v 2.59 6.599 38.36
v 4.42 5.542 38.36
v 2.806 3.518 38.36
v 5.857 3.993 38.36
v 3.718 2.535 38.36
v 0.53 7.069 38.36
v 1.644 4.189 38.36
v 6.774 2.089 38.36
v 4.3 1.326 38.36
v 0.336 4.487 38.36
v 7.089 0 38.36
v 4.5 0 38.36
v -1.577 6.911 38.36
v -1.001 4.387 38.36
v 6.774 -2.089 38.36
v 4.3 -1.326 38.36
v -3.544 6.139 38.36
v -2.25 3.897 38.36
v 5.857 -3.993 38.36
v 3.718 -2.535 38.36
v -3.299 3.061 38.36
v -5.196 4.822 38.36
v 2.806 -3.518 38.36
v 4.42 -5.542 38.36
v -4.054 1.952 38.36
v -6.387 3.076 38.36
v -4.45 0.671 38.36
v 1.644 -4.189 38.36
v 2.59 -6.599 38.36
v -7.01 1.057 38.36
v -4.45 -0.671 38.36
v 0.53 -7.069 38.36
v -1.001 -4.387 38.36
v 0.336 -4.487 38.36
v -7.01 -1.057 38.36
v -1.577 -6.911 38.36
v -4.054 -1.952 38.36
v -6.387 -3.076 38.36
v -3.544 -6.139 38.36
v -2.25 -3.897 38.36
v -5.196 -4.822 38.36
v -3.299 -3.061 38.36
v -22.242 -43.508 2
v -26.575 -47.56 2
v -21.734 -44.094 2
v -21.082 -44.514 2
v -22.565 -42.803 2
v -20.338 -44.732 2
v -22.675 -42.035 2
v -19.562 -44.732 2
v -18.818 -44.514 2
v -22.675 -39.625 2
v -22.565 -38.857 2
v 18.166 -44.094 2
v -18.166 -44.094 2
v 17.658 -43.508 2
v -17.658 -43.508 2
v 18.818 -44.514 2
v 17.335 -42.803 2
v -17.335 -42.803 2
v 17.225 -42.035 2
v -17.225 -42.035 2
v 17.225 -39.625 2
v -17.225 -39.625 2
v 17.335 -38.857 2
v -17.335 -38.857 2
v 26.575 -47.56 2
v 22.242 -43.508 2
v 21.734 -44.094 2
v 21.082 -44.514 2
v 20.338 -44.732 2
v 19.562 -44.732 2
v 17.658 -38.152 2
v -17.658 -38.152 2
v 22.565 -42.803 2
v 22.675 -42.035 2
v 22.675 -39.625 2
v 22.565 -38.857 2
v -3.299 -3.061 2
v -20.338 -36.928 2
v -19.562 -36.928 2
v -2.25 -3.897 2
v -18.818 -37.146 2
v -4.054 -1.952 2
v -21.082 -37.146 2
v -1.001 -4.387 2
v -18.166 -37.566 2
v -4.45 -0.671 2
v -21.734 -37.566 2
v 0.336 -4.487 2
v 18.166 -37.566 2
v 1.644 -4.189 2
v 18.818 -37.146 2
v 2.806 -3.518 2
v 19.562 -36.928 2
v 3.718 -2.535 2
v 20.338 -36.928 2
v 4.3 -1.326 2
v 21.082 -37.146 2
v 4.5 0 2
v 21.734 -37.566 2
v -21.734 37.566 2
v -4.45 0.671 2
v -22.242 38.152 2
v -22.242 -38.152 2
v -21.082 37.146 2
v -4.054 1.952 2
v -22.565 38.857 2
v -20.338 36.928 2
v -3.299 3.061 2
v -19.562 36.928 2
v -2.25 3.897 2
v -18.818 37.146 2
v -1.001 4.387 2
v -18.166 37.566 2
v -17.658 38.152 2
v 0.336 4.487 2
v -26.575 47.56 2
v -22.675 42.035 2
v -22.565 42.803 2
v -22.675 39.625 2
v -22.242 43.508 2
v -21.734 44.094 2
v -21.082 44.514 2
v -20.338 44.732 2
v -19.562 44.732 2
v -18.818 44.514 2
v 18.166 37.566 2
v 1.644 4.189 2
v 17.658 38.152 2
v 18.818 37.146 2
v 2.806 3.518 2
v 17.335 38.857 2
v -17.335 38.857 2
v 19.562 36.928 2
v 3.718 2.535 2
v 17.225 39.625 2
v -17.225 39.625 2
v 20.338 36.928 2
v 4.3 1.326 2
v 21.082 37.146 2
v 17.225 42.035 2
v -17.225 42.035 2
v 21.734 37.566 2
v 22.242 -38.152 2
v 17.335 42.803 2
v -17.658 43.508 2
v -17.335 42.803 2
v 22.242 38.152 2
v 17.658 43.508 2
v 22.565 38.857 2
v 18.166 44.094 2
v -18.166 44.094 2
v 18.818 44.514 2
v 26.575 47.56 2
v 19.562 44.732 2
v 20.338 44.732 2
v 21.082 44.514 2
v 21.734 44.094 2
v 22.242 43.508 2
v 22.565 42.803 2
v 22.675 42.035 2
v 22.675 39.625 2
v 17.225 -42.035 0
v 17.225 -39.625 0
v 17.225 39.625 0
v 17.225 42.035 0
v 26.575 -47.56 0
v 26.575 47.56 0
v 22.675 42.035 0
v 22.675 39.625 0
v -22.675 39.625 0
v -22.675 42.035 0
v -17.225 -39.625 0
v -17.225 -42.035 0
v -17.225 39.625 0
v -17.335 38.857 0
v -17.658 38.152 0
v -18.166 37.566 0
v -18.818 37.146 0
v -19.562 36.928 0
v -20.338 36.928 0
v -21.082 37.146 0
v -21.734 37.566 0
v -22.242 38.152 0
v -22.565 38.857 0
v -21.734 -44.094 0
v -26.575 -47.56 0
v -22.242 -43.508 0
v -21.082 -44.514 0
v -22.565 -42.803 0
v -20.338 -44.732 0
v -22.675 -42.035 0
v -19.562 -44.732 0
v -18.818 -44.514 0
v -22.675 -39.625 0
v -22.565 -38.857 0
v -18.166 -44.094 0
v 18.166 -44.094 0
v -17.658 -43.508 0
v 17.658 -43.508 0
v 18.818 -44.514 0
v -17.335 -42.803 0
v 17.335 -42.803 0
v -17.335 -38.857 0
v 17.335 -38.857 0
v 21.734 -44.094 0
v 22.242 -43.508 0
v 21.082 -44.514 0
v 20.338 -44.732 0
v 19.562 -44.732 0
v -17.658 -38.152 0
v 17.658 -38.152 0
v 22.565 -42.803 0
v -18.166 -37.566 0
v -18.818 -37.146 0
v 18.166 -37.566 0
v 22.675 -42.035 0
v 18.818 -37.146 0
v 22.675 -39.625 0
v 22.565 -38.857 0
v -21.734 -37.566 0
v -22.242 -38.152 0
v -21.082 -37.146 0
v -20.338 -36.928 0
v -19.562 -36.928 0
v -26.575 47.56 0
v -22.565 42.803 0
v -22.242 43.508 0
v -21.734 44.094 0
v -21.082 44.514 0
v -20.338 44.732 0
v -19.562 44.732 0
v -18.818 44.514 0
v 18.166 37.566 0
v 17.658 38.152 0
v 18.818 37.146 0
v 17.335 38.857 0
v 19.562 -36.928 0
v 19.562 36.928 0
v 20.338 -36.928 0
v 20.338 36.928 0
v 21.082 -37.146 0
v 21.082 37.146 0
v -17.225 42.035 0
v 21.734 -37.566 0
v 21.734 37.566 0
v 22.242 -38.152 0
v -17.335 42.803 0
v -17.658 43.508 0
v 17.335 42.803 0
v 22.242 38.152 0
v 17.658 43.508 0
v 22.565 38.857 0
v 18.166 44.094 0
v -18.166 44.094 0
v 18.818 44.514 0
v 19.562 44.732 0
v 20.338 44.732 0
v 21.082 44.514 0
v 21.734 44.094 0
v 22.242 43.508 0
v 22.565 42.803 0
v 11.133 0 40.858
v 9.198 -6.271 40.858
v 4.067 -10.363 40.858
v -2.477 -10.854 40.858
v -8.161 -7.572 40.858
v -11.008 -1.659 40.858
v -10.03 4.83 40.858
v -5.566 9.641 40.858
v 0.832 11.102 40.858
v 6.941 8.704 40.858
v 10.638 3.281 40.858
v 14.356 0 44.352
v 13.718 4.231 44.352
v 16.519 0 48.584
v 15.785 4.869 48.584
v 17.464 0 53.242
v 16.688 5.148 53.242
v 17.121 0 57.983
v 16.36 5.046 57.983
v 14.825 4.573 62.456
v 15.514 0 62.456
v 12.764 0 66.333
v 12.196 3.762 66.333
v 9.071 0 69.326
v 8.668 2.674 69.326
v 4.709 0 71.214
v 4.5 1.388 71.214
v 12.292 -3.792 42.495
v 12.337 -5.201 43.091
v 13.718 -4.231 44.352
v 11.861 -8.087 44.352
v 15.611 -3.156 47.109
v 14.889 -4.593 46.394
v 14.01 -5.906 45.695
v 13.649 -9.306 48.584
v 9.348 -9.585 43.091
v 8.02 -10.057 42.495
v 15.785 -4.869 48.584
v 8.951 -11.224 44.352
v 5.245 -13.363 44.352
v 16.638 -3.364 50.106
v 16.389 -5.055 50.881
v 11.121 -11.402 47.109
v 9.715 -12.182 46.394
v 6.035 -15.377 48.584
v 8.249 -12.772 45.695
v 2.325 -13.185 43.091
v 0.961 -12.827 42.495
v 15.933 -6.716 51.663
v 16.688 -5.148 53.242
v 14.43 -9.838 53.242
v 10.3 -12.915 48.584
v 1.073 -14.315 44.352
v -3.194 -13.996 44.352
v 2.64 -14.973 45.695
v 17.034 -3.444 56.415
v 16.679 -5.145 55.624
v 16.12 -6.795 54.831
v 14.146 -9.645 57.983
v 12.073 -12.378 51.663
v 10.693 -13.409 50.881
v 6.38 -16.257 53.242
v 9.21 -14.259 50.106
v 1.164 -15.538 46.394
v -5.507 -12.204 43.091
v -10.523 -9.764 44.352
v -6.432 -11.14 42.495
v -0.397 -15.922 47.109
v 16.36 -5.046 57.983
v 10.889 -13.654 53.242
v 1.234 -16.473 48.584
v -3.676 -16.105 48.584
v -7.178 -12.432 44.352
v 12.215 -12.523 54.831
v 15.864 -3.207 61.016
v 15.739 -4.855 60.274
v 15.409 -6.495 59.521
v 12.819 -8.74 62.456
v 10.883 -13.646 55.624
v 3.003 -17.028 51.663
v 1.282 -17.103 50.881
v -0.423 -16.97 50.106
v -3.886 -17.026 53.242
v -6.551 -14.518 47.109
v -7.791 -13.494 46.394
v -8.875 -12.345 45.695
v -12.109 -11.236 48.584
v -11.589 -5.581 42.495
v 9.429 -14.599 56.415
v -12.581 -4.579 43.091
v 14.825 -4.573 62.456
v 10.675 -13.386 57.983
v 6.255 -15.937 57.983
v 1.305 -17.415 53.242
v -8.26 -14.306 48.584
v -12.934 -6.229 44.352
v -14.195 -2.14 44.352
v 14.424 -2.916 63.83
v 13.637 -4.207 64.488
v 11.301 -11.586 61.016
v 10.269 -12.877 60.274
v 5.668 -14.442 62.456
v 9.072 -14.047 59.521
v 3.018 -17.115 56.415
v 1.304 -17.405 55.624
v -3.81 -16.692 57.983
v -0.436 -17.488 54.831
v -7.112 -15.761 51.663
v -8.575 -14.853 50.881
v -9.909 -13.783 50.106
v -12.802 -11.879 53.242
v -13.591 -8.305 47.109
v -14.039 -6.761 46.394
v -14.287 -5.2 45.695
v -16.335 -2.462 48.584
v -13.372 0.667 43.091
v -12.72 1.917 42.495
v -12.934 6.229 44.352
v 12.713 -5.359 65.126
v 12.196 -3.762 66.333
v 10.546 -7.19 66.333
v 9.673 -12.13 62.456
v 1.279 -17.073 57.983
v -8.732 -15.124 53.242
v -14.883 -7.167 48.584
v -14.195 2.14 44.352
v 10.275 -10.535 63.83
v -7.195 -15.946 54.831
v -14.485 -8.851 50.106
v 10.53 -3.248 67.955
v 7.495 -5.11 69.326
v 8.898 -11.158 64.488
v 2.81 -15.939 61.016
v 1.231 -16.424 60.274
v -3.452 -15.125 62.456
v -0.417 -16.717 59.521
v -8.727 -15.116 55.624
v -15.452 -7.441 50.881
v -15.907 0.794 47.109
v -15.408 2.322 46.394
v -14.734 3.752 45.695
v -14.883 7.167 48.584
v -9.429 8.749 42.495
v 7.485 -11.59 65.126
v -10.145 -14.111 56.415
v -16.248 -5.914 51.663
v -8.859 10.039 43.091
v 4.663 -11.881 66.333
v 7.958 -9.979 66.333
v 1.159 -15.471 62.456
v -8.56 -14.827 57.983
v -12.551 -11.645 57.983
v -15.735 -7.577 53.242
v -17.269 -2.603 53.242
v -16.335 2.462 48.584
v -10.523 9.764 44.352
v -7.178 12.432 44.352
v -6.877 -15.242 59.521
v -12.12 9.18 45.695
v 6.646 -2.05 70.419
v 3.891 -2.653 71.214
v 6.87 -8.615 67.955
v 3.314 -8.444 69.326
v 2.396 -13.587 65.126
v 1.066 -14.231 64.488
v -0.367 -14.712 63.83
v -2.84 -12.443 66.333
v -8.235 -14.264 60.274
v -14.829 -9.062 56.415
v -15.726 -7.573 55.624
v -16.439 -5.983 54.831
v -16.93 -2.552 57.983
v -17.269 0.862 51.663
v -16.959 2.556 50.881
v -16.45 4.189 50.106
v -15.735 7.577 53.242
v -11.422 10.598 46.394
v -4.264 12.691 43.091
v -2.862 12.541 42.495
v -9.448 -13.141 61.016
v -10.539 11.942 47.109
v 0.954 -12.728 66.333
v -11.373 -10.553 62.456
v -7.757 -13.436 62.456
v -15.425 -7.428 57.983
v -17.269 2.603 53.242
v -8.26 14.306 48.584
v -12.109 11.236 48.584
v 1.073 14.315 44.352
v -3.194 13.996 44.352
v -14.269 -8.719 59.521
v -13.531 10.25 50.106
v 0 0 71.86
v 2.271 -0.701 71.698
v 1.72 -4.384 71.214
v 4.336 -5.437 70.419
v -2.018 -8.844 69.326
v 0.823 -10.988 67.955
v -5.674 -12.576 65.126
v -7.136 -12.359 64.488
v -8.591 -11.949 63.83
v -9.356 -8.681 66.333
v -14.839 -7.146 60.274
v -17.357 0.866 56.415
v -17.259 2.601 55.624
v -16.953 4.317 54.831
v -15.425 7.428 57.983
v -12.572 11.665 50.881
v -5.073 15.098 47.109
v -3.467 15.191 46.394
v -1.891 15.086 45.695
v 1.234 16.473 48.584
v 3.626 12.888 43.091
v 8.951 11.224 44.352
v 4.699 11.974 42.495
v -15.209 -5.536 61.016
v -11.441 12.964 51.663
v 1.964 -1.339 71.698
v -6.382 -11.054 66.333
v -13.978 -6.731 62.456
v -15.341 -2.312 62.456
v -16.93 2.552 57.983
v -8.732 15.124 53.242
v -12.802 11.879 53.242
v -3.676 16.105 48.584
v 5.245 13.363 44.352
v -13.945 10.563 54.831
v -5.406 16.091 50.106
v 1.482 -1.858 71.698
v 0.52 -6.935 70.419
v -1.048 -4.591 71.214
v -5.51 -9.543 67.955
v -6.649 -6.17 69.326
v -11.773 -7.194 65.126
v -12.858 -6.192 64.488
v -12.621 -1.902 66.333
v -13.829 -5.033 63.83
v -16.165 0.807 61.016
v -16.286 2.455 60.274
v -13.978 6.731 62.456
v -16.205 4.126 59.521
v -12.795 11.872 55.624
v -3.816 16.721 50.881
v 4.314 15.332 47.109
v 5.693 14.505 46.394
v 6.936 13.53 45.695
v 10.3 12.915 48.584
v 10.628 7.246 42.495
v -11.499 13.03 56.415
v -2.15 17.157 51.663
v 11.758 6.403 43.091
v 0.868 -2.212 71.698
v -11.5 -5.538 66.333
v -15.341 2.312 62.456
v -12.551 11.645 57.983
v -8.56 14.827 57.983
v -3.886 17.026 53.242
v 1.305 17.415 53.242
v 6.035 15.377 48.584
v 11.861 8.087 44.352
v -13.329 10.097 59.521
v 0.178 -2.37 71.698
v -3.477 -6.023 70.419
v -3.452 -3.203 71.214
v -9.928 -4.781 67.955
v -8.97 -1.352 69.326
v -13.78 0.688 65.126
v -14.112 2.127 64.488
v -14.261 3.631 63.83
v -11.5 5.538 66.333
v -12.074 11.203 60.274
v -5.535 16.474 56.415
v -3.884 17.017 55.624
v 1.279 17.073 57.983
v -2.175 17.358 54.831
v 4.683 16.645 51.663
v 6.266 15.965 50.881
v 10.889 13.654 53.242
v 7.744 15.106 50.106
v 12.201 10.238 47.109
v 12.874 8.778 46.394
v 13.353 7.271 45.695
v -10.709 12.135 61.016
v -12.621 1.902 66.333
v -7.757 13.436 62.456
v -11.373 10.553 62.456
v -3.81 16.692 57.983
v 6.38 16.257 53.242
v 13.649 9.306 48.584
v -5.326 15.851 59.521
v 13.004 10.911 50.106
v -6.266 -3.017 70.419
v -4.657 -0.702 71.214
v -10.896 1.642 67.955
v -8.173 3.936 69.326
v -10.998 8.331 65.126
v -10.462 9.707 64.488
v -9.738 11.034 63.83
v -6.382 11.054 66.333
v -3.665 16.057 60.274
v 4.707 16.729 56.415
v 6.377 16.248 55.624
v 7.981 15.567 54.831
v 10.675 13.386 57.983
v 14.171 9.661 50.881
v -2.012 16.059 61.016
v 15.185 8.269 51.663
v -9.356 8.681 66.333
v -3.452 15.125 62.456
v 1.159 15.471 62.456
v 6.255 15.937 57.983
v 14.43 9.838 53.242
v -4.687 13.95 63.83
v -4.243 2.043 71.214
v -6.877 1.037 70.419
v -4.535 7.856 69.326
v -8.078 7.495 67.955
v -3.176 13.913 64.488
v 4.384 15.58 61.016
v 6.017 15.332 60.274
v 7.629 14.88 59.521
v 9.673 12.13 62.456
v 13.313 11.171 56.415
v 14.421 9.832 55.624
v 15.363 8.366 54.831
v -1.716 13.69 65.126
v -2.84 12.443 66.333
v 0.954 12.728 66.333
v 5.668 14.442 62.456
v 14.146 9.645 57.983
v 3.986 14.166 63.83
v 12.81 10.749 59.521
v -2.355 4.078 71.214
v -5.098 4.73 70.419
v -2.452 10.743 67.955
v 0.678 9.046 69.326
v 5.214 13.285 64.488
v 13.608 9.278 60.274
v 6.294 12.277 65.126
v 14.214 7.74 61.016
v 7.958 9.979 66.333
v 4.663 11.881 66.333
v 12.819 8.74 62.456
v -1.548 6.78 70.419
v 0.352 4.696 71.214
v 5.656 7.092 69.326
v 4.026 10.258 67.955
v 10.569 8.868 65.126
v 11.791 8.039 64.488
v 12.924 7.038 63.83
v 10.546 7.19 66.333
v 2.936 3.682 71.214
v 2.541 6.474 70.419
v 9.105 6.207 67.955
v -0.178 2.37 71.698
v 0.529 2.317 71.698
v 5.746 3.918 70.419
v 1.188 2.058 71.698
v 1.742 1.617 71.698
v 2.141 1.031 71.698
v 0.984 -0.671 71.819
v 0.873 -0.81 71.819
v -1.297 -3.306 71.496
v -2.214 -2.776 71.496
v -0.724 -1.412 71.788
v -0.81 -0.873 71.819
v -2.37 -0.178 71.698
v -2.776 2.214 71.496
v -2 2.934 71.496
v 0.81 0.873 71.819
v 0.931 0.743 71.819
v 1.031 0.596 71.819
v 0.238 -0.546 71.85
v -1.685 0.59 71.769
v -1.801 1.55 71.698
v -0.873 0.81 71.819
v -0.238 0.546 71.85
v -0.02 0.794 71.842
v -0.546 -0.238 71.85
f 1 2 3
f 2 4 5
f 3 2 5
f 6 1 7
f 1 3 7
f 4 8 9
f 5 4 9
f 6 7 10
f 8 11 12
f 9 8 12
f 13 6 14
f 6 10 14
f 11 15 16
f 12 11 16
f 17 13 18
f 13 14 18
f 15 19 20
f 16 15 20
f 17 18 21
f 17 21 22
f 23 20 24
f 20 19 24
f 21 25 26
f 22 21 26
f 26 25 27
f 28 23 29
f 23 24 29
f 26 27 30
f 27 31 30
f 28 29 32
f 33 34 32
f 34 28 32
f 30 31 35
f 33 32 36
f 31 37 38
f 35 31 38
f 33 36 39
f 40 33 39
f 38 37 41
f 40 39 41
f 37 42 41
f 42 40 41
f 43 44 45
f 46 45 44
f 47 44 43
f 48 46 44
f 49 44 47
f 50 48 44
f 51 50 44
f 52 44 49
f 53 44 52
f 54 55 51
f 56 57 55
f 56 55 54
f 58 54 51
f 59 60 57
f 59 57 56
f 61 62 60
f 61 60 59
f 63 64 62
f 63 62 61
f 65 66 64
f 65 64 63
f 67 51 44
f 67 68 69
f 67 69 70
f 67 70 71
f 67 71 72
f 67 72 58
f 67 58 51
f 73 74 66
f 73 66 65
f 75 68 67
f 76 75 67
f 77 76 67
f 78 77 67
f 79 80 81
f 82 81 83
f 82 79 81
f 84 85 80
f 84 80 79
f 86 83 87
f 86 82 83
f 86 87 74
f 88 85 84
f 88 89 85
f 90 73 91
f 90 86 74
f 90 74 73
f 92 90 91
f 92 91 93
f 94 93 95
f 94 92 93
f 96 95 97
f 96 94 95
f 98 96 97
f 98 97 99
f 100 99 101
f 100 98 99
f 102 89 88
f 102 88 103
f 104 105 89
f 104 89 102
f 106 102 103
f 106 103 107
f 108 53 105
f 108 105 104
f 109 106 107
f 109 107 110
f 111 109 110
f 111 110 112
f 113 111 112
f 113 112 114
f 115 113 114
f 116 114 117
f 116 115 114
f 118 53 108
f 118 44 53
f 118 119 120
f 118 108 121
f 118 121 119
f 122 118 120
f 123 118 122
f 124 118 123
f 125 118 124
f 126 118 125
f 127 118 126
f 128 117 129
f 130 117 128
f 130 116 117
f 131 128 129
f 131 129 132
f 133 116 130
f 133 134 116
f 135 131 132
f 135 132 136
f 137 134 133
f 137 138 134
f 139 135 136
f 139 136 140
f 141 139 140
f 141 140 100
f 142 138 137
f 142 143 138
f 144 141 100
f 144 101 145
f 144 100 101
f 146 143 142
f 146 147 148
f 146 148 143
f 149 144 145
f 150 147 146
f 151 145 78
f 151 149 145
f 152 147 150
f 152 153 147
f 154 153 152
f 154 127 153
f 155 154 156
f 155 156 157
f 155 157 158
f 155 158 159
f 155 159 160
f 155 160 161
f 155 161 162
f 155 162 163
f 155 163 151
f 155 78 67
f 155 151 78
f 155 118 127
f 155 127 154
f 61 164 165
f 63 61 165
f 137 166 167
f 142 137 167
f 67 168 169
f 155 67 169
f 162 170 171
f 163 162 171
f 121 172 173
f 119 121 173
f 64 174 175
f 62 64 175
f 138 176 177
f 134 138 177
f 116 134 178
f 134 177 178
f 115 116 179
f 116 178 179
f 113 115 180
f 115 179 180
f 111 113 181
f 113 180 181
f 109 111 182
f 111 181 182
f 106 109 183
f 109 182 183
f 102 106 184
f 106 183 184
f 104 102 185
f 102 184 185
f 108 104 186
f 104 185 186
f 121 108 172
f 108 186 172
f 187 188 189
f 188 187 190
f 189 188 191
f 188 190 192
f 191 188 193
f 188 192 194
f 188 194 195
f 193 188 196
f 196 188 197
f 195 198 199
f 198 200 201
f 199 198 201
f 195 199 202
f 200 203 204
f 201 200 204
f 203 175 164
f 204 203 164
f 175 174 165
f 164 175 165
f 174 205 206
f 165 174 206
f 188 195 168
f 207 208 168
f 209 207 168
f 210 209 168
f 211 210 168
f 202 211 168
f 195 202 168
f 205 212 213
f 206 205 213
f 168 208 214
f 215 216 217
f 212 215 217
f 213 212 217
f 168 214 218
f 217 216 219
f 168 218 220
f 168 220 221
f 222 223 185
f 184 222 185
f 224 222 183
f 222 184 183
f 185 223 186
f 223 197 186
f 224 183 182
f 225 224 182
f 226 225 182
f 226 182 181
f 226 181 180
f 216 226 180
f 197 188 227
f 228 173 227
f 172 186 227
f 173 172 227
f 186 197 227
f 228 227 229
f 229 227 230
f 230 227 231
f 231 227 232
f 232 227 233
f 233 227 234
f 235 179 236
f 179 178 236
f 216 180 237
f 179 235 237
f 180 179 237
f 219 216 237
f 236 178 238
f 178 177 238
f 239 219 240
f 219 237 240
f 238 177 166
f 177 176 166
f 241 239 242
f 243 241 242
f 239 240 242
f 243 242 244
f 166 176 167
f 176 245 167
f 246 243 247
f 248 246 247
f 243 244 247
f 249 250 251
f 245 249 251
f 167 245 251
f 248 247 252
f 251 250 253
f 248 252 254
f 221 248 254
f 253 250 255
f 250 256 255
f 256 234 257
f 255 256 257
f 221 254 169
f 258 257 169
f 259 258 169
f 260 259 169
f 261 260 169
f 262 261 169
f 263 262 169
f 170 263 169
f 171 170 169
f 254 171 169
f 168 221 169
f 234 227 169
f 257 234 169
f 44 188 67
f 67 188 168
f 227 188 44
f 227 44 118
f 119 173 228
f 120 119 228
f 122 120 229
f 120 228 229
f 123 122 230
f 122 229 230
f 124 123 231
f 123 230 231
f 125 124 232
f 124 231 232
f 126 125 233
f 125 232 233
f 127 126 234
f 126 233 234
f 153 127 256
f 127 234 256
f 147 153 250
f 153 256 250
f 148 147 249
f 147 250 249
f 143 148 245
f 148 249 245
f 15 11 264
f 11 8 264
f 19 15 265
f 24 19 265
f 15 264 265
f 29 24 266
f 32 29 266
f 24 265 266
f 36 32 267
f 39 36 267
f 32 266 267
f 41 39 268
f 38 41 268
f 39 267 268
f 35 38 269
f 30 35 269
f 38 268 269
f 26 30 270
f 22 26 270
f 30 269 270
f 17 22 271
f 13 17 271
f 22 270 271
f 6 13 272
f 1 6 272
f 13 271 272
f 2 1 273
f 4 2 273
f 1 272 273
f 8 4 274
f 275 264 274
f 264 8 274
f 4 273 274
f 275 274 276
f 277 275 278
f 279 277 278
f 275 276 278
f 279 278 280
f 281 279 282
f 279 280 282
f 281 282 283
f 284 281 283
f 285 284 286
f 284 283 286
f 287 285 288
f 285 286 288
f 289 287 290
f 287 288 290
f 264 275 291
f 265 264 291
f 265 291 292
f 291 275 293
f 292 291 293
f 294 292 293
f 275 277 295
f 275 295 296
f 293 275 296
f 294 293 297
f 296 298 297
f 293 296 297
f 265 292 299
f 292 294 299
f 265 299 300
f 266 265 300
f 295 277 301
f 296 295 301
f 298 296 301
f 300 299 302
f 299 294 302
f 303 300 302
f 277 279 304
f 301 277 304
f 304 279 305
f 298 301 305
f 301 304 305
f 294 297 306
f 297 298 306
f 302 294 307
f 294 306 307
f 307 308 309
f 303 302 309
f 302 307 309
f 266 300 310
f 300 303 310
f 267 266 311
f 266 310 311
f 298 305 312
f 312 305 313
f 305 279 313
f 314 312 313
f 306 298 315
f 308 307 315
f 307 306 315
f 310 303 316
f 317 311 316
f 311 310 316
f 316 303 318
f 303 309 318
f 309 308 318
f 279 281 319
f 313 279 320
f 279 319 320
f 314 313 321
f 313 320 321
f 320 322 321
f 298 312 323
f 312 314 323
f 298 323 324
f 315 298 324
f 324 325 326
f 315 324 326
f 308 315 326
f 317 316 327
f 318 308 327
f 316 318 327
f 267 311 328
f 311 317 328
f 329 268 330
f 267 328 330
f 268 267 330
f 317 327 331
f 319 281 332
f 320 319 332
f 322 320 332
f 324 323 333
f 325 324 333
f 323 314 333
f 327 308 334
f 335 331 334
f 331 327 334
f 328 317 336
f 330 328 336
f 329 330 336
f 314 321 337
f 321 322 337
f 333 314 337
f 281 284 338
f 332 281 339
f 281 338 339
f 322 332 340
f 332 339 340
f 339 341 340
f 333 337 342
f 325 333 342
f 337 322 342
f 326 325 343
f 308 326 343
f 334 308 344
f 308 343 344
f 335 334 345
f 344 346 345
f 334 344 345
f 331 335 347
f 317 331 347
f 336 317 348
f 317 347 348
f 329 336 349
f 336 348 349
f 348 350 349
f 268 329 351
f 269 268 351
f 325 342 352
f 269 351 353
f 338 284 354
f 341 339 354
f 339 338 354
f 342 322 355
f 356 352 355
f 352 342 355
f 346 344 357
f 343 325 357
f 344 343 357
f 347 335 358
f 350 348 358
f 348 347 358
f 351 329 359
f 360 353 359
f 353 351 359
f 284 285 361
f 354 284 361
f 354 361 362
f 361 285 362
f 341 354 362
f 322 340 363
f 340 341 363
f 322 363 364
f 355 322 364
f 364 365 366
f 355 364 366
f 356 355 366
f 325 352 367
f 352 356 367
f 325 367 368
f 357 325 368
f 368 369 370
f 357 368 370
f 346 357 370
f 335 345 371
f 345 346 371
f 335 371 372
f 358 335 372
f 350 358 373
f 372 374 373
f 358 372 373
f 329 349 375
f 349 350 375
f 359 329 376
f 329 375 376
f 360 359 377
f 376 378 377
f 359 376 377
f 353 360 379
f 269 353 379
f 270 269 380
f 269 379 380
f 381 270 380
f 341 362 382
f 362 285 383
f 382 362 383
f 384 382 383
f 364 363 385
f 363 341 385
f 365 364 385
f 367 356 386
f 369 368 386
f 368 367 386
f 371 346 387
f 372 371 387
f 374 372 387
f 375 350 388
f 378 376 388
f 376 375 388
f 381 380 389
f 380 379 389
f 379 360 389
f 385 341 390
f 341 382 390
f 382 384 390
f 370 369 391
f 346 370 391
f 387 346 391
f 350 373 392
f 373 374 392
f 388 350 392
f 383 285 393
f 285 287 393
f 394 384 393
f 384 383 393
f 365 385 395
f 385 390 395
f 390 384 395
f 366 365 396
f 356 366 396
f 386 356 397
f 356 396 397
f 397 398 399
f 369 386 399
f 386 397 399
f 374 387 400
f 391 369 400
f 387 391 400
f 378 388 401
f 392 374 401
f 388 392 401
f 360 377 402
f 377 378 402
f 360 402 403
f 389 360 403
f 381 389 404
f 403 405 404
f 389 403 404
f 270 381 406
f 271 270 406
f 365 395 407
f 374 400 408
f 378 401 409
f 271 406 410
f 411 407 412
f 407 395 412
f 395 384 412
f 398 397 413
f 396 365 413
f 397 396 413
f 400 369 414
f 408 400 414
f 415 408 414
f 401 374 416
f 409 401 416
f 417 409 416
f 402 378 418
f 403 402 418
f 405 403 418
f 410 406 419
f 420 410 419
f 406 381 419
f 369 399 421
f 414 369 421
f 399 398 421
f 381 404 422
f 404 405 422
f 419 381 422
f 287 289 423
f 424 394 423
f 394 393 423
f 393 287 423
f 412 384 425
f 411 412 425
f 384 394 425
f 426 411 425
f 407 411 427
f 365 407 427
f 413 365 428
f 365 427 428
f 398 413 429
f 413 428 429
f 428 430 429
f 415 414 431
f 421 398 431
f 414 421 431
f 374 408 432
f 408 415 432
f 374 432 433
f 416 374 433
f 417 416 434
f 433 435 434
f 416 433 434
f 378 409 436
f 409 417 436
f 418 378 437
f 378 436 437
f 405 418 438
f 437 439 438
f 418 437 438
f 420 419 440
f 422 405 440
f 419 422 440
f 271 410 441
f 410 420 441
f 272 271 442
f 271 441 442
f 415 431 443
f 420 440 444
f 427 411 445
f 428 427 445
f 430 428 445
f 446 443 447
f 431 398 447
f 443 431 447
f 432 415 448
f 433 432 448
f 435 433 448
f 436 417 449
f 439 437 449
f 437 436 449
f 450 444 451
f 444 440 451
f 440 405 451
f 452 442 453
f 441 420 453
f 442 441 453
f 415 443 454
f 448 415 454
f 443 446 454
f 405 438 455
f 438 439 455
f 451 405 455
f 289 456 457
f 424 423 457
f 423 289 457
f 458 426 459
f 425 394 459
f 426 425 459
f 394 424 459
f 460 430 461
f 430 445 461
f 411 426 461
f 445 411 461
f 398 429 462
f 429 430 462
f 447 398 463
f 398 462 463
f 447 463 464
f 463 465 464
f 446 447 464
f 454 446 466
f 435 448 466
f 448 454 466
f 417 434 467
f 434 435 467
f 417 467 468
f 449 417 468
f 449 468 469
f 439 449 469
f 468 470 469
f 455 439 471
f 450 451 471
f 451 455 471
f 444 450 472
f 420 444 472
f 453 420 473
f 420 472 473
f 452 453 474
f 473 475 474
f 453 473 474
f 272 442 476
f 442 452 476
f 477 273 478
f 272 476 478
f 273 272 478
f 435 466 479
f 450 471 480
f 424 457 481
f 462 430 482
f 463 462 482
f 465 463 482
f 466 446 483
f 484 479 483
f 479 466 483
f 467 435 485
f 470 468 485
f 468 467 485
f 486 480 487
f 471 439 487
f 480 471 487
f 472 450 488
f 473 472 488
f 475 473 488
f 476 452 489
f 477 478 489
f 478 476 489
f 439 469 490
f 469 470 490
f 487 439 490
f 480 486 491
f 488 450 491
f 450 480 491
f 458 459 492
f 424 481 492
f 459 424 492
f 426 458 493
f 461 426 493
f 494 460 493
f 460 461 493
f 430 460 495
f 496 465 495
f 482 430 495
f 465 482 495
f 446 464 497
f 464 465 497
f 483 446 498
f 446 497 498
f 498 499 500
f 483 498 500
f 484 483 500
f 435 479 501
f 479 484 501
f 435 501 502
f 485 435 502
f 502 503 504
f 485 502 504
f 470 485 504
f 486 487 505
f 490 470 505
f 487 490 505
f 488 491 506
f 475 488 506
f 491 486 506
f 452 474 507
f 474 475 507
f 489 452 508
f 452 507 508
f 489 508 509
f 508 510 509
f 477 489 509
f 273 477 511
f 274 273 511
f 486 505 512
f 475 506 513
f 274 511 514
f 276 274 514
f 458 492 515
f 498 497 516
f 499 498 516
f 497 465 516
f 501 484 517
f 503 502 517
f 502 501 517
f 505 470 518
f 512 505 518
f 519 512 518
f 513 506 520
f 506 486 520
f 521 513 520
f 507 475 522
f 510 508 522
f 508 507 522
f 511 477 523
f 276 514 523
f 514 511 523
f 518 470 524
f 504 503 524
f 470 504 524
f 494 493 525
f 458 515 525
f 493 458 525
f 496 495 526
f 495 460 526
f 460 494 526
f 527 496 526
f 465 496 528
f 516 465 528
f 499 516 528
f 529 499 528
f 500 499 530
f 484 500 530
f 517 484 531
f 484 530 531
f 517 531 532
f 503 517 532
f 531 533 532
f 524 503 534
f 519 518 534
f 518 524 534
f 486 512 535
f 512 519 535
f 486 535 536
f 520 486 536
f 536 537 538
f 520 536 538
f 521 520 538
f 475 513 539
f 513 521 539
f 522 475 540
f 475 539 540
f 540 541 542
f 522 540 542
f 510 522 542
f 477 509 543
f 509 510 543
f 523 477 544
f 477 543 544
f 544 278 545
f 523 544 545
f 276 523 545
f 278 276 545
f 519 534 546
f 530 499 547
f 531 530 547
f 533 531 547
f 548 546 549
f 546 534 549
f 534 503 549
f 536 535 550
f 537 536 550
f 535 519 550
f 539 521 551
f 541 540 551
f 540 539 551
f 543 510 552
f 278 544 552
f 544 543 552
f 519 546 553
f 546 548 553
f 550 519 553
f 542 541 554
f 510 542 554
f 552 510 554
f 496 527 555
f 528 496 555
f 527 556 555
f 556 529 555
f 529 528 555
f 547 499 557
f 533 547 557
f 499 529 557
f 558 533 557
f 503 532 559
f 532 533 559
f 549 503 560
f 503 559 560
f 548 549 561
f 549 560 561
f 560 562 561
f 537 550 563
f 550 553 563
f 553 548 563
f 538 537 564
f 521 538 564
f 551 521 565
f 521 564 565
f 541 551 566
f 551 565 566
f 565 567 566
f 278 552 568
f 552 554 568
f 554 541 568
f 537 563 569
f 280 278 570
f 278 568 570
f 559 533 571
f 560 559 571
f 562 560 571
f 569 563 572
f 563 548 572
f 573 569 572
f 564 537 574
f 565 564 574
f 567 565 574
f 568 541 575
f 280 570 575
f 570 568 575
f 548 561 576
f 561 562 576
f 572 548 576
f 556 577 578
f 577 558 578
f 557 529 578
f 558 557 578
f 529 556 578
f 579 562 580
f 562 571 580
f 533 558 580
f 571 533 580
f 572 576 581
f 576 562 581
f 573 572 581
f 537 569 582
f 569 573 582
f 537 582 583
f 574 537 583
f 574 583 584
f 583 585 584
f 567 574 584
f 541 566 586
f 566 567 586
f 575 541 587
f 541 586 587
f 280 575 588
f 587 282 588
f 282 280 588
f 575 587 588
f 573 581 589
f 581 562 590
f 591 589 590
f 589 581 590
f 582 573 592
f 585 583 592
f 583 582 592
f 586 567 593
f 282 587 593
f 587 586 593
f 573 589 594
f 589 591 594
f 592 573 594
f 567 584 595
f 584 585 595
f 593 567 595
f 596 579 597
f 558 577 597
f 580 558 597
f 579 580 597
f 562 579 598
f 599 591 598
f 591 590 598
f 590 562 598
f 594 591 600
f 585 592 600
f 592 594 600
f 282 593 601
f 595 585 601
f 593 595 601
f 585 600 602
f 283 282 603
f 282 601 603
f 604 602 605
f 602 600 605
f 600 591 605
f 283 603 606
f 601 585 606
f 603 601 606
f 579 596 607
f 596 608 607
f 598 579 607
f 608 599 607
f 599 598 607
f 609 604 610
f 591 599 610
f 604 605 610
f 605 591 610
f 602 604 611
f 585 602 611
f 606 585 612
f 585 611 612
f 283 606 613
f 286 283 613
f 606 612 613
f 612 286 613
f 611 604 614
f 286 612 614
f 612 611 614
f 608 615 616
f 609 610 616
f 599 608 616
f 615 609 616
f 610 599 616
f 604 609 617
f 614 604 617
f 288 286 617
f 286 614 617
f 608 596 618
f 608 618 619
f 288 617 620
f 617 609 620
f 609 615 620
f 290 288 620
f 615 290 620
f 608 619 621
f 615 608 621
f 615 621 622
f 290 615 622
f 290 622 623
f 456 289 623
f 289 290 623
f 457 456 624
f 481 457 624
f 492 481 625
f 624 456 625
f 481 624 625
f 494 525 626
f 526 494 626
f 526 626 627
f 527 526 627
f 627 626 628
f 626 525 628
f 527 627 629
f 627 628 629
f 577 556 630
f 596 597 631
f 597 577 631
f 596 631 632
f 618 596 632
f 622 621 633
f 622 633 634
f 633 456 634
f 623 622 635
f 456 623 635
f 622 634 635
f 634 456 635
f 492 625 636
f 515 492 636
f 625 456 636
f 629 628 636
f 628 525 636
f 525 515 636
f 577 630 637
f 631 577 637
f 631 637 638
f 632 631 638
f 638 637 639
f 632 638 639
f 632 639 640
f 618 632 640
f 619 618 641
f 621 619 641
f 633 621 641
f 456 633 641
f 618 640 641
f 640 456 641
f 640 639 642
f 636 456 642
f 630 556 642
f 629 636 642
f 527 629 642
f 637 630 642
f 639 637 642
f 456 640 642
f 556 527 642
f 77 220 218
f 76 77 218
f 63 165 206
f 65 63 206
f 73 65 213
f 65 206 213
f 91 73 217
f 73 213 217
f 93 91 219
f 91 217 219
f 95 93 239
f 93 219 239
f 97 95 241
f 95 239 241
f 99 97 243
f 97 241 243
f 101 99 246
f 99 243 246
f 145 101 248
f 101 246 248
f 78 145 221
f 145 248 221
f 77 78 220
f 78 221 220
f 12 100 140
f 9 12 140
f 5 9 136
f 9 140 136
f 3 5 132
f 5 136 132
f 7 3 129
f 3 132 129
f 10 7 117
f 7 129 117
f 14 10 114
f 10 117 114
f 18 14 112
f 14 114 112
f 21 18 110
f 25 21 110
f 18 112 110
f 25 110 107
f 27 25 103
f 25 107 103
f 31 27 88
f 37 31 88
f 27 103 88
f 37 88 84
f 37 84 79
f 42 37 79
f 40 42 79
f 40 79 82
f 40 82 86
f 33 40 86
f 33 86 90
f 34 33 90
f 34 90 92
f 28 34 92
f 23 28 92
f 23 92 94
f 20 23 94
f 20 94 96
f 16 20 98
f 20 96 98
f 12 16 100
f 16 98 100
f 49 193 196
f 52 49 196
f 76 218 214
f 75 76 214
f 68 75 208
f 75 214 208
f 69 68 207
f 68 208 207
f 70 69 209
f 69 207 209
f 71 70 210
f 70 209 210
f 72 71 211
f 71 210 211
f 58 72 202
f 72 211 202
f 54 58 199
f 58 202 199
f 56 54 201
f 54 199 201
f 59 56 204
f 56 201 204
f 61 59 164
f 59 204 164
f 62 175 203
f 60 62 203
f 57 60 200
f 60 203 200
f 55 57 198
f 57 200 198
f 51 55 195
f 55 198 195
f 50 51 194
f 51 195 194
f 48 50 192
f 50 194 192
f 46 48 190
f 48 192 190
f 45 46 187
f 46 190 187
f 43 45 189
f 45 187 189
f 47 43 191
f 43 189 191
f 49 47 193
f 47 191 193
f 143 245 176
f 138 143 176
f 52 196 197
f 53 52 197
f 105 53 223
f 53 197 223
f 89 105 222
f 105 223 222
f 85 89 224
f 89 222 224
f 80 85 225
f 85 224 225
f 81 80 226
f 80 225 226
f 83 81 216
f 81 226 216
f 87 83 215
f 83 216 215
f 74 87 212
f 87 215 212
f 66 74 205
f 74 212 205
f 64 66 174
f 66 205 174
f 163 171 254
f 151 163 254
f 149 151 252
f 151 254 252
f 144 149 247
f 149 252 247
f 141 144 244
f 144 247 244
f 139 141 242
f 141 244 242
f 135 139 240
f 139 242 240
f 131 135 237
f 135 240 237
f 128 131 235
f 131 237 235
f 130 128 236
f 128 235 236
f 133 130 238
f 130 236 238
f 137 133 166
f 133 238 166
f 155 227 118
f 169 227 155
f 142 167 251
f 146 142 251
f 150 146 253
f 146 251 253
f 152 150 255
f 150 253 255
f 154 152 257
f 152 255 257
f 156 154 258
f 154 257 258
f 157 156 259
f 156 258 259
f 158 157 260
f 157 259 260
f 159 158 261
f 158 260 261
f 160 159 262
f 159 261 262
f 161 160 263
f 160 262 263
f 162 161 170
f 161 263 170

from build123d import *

# Parameters (mm, degrees)
F0_W     = 53.15
F0_H     = 95.12
F1_DEPTH = 2
F2_R     = 4.5
F3_DEPTH = 36.36


with BuildPart() as f1:
    # F0 (on Top) → F1 (new body)
    with BuildSketch(Plane.XY):
        Rectangle(F0_W, F0_H)
        with BuildLine():
            Line((-22.675, -42.035), (-22.675, -39.625))
            ThreePointArc((-22.675, -39.625), (-19.95, -36.9), (-17.225, -39.625))
            Line((-17.225, -39.625), (-17.225, -42.035))
            ThreePointArc((-17.225, -42.035), (-19.95, -44.76), (-22.675, -42.035))
        make_face(mode=Mode.SUBTRACT)
        with BuildLine():
            ThreePointArc((17.225, -39.625), (19.95, -36.9), (22.675, -39.625))
            Line((22.675, -39.625), (22.675, -42.035))
            ThreePointArc((22.675, -42.035), (19.95, -44.76), (17.225, -42.035))
            Line((17.225, -42.035), (17.225, -39.625))
        make_face(mode=Mode.SUBTRACT)
        with BuildLine():
            Line((-17.225, 42.035), (-17.225, 39.625))
            ThreePointArc((-17.225, 39.625), (-19.95, 36.9), (-22.675, 39.625))
            Line((-22.675, 39.625), (-22.675, 42.035))
            ThreePointArc((-22.675, 42.035), (-19.95, 44.76), (-17.225, 42.035))
        make_face(mode=Mode.SUBTRACT)
        with BuildLine():
            ThreePointArc((17.225, 42.035), (19.95, 44.76), (22.675, 42.035))
            Line((22.675, 42.035), (22.675, 39.625))
            ThreePointArc((22.675, 39.625), (19.95, 36.9), (17.225, 39.625))
            Line((17.225, 39.625), (17.225, 42.035))
        make_face(mode=Mode.SUBTRACT)
    extrude(amount=F1_DEPTH)

    # F2 (on face) → F3 (join)
    with BuildSketch(Plane.XY.offset(2)):
        Circle(F2_R)
    extrude(amount=F3_DEPTH)

    # F4 (on Front) → F5 (revolve)
    with BuildSketch(Plane.XZ):
        with BuildLine():
            Line((0, 38.36), (7.088723, 38.36))
            ThreePointArc((7.088723, 38.36), (17.120894, 57.982844), (0, 71.86))
            Line((0, 71.86), (0, 38.36))
        make_face()
    revolve(axis=Axis((0, 0, 55.11), (0, 0, -1)))


solid = f1.part
